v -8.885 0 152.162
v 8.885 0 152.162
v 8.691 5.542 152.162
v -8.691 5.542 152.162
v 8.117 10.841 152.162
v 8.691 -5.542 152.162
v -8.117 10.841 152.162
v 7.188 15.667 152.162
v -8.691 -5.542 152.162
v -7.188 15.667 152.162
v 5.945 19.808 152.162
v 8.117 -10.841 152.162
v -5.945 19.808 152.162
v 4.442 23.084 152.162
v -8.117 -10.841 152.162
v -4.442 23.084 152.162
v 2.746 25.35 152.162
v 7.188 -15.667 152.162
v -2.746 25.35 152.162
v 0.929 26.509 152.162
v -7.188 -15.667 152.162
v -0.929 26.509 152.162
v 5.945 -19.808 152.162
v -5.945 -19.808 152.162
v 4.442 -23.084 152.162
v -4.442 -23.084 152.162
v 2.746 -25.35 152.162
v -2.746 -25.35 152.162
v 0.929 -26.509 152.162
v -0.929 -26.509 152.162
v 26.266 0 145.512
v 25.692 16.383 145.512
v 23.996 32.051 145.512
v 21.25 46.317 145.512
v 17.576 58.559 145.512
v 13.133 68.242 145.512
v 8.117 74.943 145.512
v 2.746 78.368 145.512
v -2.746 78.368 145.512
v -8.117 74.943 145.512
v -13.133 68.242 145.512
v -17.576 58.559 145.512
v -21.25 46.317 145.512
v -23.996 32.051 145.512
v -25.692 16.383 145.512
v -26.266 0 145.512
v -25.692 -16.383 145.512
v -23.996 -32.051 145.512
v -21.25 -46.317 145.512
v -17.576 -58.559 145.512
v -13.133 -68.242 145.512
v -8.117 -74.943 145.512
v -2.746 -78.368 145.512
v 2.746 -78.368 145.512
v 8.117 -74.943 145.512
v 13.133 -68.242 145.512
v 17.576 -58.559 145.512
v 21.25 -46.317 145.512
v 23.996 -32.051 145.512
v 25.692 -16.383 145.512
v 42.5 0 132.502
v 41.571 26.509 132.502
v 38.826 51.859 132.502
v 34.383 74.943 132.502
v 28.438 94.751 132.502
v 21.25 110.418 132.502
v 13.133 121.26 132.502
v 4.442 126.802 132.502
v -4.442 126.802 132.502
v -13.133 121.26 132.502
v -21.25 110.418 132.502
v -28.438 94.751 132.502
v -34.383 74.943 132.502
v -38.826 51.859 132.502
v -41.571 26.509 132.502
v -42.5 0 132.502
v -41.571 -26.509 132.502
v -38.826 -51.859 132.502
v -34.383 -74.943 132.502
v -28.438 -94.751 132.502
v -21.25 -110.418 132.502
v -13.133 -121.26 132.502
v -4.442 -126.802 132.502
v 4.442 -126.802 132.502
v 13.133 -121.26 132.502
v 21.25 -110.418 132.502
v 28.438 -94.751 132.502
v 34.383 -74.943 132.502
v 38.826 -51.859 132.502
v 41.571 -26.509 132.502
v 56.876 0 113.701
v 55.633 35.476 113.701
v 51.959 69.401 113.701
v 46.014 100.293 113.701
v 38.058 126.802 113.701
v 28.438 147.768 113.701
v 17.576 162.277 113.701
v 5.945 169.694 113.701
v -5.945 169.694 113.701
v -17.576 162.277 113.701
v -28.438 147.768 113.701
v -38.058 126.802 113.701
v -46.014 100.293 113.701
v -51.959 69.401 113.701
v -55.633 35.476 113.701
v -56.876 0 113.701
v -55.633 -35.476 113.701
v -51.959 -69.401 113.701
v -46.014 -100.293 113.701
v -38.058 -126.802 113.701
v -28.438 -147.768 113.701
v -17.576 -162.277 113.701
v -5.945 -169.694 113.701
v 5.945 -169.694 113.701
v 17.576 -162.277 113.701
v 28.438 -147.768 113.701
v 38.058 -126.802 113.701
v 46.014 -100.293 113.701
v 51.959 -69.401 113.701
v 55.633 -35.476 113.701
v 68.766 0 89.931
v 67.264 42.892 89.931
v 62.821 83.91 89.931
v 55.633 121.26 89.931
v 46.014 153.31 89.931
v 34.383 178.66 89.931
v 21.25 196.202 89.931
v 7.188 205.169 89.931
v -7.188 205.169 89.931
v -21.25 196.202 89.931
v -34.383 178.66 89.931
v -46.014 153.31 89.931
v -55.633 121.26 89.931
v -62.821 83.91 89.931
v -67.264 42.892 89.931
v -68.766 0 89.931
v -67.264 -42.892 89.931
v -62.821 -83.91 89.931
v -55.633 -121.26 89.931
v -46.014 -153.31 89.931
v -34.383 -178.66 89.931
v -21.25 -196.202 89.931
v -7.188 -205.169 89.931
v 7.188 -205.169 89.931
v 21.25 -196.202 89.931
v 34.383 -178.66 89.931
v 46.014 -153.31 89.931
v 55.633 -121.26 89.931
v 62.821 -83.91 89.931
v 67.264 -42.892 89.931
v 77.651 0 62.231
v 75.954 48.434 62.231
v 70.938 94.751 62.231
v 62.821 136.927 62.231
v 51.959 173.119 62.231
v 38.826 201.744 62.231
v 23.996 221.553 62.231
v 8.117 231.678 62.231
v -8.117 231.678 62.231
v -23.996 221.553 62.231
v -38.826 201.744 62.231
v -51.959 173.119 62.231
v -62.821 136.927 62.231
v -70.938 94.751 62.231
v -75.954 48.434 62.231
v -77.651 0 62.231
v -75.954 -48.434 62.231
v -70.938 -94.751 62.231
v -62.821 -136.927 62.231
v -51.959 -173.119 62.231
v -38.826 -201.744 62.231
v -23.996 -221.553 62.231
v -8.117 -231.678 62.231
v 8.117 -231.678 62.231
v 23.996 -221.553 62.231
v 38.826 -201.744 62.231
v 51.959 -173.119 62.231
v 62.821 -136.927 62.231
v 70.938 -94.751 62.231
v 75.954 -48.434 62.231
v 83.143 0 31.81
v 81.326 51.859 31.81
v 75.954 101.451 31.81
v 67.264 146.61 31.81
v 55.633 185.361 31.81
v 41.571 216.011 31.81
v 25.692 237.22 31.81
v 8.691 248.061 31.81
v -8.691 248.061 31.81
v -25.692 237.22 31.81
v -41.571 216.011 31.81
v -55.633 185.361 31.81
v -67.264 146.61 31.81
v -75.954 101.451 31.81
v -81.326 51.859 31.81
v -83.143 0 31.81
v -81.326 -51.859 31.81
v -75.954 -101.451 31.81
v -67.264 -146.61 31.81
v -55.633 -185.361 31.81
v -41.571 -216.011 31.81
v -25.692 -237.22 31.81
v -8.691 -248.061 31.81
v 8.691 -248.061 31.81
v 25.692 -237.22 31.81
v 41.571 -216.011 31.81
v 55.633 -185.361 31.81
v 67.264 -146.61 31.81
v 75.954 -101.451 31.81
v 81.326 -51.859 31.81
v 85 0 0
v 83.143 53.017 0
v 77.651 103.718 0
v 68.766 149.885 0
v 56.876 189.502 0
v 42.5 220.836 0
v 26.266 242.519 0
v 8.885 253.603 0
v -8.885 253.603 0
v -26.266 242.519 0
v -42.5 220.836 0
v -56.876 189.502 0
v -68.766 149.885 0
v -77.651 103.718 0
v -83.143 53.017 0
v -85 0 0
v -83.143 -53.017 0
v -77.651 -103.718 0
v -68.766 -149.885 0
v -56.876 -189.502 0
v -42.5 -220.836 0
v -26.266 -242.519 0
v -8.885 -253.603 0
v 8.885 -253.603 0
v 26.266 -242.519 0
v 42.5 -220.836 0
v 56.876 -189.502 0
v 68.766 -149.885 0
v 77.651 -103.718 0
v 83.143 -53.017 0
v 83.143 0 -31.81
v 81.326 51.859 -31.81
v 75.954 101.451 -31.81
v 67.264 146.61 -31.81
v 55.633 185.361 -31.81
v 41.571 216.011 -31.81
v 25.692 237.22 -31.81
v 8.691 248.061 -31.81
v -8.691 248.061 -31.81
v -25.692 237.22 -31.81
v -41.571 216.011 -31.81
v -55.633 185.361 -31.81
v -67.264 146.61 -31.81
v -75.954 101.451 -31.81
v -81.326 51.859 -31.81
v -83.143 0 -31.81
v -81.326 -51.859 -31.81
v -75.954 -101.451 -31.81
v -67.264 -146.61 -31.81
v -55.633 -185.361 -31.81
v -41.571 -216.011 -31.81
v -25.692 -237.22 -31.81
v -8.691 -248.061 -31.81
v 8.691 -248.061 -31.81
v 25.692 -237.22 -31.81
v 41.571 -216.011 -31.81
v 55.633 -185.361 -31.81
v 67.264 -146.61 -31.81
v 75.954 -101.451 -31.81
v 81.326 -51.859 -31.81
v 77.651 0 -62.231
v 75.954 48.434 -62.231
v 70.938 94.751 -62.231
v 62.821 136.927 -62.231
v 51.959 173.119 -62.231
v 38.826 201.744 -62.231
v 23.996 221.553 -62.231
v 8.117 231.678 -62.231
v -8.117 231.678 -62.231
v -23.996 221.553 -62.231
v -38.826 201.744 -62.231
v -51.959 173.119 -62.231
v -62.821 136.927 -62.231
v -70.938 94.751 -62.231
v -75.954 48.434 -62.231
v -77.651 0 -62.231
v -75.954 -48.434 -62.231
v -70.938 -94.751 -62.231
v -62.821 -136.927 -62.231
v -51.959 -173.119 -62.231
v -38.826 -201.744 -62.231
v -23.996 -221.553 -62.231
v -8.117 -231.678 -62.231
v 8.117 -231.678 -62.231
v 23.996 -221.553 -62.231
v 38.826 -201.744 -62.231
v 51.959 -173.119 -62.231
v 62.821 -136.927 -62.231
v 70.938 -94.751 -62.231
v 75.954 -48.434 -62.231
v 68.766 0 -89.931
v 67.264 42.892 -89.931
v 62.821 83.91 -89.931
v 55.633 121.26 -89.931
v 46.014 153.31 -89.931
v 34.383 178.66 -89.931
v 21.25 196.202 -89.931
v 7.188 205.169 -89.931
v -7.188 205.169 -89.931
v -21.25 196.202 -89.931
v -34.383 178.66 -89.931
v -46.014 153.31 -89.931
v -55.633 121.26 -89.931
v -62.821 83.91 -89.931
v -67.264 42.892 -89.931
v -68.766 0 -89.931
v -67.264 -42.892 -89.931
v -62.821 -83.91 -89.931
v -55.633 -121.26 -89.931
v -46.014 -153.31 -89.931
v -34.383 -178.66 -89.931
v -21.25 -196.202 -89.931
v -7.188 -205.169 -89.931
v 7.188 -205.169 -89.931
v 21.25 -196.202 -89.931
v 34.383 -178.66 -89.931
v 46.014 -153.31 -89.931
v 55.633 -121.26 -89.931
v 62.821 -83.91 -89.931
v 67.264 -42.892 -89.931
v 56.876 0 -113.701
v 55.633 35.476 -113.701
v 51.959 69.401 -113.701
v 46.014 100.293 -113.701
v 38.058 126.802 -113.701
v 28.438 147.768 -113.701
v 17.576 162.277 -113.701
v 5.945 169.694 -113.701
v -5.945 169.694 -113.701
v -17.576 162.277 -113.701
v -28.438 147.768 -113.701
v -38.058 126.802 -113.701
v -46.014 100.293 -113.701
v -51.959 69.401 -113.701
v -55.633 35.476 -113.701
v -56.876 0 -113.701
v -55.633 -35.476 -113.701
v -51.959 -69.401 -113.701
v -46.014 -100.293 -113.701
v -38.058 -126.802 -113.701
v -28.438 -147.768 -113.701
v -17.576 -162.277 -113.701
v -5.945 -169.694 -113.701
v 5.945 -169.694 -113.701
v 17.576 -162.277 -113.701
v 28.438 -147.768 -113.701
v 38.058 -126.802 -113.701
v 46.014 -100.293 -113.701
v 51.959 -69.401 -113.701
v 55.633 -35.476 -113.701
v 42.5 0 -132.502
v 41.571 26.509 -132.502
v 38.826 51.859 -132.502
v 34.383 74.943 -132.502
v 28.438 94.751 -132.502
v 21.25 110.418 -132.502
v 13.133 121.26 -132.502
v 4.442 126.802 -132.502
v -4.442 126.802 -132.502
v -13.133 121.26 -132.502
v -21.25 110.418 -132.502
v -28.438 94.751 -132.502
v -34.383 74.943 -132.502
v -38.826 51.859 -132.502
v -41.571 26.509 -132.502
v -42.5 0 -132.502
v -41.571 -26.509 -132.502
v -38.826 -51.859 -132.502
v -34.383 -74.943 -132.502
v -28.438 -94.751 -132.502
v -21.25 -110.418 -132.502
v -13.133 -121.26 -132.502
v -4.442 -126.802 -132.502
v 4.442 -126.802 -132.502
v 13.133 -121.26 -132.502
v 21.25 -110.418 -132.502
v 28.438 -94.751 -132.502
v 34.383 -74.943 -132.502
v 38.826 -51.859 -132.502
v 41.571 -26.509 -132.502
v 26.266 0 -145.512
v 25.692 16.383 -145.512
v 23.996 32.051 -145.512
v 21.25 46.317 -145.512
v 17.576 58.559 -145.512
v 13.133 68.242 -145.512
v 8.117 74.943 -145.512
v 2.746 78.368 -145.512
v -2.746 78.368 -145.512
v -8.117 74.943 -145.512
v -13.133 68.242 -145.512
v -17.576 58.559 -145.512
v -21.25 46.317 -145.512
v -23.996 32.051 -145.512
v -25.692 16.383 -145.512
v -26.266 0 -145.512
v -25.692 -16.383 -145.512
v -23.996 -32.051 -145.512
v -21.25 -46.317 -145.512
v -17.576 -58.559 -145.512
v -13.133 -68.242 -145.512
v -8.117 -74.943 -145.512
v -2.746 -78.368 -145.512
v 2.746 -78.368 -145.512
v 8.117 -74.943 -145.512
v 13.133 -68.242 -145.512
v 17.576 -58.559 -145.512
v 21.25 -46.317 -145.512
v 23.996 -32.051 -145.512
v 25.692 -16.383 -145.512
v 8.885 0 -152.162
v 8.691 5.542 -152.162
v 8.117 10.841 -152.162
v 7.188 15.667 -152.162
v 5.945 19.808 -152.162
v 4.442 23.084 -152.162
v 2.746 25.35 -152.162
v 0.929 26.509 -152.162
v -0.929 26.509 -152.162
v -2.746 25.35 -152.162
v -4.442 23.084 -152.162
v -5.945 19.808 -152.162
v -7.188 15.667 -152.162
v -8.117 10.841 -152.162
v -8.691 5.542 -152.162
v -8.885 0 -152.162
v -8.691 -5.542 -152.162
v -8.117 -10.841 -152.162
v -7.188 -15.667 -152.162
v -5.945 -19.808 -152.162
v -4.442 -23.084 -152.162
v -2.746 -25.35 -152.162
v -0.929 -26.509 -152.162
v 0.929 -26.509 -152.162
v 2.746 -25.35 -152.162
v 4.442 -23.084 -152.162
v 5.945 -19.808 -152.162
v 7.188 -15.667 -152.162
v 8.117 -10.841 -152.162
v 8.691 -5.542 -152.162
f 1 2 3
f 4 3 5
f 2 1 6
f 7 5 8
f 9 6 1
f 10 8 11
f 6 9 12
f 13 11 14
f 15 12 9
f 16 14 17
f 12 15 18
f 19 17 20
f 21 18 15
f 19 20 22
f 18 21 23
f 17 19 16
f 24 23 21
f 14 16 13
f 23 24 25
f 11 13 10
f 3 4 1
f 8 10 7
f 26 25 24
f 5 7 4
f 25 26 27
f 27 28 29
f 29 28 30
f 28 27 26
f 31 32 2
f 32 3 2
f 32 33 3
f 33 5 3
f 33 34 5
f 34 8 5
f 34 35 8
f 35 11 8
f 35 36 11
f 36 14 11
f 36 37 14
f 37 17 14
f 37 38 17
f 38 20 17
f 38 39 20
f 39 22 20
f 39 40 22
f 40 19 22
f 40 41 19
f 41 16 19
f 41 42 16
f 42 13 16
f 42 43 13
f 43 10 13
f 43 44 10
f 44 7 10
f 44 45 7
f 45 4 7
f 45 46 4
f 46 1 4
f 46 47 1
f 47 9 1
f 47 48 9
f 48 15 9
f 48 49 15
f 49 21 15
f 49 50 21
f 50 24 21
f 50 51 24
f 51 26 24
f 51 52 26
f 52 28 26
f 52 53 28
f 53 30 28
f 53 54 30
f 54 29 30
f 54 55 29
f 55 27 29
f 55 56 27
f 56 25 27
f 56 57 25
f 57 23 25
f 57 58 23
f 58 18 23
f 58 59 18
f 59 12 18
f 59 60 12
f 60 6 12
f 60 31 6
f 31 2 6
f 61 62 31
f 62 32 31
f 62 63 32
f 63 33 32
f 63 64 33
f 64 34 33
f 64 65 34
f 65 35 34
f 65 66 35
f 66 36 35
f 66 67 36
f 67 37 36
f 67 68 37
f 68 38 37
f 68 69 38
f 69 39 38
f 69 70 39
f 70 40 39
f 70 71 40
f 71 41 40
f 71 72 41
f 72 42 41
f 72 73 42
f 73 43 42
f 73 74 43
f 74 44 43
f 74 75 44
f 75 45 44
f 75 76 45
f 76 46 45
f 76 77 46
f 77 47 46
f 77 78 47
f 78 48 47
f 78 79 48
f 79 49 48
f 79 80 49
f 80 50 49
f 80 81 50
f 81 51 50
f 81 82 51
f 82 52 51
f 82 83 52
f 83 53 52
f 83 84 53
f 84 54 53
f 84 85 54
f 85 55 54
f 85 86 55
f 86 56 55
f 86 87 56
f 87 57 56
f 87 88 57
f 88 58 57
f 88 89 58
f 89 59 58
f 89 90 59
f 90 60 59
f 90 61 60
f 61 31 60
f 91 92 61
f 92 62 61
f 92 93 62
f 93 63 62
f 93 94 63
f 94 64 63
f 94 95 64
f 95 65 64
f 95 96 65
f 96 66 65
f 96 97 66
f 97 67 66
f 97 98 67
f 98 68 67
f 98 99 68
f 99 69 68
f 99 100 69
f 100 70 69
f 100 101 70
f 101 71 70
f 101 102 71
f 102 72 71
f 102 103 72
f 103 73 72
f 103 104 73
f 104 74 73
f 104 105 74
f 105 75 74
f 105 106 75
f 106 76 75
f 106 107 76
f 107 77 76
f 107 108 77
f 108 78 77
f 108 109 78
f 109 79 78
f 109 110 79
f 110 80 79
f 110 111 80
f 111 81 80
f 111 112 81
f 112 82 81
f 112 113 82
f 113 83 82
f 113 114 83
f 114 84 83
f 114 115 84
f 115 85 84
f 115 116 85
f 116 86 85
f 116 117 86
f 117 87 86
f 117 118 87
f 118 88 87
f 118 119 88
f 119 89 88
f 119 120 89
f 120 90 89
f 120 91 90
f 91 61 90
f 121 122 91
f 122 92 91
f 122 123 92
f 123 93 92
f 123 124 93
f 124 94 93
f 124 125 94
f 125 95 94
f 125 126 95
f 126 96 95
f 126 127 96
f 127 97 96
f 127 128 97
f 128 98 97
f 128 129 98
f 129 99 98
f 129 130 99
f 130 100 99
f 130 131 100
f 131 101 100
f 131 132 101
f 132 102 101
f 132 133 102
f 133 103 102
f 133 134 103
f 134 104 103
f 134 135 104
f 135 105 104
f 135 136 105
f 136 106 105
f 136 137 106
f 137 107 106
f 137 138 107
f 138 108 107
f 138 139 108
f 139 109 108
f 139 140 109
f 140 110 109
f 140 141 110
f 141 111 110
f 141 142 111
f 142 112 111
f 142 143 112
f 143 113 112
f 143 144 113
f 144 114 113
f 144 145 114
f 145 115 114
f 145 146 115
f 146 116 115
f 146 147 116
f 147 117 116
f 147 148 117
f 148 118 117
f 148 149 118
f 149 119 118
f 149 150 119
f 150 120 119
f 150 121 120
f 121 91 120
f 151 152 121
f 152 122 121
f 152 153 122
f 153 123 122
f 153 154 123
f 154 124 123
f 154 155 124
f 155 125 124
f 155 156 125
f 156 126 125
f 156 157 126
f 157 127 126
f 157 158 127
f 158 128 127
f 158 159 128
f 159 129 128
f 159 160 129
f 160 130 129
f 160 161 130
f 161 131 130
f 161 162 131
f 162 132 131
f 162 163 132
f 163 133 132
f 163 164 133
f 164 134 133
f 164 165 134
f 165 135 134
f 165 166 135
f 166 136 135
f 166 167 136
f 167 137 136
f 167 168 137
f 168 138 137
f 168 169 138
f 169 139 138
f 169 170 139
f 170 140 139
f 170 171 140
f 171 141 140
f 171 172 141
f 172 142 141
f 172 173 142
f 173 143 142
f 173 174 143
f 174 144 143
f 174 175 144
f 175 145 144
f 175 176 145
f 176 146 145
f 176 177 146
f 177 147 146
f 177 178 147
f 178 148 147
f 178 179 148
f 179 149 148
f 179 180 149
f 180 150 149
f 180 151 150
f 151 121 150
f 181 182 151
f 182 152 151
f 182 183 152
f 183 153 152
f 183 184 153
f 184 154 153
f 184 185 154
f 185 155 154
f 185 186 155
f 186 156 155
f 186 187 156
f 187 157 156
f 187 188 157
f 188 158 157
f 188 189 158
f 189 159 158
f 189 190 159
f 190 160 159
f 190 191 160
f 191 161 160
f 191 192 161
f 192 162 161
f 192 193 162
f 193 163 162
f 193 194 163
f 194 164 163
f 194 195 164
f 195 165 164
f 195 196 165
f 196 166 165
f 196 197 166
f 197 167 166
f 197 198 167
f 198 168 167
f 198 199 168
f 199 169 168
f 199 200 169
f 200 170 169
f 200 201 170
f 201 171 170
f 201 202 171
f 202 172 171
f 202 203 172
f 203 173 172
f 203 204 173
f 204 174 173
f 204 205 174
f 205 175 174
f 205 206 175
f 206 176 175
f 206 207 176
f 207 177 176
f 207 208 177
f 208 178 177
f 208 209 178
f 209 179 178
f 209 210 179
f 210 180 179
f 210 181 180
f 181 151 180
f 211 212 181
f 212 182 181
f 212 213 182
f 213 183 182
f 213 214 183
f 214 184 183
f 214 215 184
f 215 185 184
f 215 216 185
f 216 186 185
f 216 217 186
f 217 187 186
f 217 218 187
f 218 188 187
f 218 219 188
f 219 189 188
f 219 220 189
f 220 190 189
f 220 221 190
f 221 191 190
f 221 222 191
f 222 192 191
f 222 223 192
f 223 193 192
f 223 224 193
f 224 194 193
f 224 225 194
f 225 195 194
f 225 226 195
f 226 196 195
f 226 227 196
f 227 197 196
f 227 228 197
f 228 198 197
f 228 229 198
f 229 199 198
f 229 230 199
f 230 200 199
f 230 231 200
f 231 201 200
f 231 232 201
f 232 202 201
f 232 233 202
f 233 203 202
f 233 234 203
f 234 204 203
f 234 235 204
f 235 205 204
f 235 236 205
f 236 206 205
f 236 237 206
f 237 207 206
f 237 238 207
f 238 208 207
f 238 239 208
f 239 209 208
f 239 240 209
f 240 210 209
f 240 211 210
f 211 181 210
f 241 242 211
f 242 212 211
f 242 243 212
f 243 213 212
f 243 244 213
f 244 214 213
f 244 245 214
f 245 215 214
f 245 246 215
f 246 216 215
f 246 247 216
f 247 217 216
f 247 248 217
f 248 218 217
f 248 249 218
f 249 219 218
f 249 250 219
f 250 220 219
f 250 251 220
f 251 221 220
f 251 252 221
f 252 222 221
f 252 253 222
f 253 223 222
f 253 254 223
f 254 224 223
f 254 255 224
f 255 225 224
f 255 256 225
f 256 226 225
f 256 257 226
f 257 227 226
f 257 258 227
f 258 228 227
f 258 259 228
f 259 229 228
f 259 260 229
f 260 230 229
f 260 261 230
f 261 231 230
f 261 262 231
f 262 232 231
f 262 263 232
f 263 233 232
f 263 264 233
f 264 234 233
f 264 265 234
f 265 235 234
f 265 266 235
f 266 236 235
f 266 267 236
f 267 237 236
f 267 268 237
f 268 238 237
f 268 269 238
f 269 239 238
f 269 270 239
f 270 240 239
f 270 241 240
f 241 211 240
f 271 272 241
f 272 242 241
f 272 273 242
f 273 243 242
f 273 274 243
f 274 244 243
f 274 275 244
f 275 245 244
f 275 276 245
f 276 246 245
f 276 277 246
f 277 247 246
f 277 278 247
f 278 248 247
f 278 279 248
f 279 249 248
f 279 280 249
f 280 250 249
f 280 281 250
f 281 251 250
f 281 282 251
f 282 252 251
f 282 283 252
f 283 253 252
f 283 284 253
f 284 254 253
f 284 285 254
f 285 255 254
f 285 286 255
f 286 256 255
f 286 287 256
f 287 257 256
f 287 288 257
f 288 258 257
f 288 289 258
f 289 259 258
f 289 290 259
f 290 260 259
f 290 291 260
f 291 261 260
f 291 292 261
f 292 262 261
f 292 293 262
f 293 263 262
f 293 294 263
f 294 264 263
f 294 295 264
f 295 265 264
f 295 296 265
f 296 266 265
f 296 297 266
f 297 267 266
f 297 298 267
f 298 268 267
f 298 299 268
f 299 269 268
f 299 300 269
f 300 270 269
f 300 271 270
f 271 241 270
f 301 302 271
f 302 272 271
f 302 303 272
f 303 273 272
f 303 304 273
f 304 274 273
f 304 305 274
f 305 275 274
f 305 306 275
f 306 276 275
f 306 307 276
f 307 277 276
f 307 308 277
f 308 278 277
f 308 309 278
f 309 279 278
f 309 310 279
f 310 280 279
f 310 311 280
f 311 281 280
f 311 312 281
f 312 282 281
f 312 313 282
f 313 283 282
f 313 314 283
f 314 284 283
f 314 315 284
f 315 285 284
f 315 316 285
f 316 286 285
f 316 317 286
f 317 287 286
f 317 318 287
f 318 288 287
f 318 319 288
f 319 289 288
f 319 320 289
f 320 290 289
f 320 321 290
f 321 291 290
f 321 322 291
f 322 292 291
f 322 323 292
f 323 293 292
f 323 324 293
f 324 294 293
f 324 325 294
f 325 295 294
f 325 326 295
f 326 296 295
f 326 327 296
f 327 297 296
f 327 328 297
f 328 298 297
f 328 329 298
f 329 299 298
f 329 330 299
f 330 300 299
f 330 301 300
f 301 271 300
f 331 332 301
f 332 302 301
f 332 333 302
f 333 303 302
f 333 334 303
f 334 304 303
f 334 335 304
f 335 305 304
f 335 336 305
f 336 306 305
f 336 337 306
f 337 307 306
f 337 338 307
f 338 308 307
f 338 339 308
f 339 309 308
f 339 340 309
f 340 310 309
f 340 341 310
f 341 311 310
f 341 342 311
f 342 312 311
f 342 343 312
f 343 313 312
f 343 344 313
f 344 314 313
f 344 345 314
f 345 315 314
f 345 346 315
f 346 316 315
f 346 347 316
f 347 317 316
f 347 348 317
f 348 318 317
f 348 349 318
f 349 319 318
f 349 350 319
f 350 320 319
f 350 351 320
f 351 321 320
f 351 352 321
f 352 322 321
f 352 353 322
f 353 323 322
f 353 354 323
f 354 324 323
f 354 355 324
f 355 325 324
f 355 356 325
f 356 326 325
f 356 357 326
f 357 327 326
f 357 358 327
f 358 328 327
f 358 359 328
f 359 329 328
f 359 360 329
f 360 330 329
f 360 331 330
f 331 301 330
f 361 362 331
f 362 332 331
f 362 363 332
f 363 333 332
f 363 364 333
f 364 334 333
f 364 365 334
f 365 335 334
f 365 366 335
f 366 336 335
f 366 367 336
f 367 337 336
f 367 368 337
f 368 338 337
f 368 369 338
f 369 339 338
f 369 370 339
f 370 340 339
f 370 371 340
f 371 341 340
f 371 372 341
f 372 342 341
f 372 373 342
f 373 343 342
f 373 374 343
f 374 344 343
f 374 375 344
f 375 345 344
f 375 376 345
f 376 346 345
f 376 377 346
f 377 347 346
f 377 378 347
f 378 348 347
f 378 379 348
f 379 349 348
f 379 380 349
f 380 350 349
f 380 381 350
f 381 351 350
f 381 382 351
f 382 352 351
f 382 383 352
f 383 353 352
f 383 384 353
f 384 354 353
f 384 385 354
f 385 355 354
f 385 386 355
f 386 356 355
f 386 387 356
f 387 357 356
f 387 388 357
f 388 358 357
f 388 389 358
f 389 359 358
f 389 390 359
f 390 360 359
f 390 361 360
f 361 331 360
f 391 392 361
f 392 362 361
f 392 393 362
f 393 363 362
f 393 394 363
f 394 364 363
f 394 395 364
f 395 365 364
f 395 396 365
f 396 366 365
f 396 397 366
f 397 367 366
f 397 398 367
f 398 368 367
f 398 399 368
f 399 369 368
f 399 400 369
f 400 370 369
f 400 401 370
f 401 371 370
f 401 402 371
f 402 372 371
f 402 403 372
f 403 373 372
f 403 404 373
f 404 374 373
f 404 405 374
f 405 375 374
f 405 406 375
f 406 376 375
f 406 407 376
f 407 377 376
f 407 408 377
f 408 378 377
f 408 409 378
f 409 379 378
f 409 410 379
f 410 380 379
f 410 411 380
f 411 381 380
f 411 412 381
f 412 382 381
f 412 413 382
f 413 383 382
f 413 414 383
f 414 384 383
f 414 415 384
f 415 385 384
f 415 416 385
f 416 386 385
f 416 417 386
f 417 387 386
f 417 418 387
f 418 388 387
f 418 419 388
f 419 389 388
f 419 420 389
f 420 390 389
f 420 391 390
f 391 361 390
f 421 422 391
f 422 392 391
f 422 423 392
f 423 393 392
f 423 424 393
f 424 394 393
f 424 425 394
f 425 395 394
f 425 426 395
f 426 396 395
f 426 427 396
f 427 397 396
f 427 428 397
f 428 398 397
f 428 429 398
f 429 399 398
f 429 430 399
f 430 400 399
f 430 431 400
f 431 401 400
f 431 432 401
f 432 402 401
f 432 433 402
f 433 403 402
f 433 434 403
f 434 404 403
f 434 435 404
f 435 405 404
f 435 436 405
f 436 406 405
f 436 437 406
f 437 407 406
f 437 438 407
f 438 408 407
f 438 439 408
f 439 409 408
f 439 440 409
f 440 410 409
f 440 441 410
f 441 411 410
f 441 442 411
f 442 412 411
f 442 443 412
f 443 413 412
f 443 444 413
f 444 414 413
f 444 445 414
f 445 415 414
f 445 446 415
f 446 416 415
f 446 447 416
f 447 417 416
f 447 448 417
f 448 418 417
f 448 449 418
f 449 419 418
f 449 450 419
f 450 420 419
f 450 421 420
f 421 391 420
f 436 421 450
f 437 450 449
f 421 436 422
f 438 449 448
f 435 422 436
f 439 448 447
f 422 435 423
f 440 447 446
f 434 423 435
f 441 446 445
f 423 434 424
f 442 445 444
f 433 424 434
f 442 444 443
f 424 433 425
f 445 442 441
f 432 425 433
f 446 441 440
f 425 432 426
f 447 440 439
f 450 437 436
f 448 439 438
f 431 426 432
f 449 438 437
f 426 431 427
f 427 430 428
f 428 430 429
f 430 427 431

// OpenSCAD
// Generated by SolidPython 1.0.1 on 2020-07-29 00:46:46


scale(v = [5, 15, 9]) {
	sphere(r = 17);
}
/***********************************************
*********      SolidPython code:      **********
************************************************
 
# import packages: SolidPython
from solid import *
from solid.utils import *
from itertools import chain, combinations, permutations


class Resize:

    def __init__(self, scad_file):
        self.scad_file = scad_file
        #self.scad_file = import_scad(scad_file)
        # cone/cylinder param:
        self.r1 = 0
        self.r2 = 0
        self.h = 0
        # rectangular prism param:
        self.w = 0
        self.l = 0
        # ellipse param:
        self.r = 0

    # import OpenScad code (file name corresponds to shape)


    # classify shape + parameters
    def assign(self, param1, param2, param3):
        if self.scad_file == 'cone.scad':
            self.r1 = param1
            self.r2 = param2
            self.h = param3
        elif self.scad_file == 'cylinder.scad':
            self.r1 = param1
            self.r2 = param2
            self.h = param3
        elif self.scad_file == 'rectangularPrism.scad':
            self.h = param1
            self.l = param2
            self.w = param3
        else:
            self.r = param1
            self.h = param2

    # resize parameters
    def iterate(self):
        x = range(3, 20, 2)
        i = 1
        if self.scad_file == 'cone.scad':
            tempList = list(permutations(x, 2))
            for temp in tempList:
                param1 = temp[0]
                param2 = temp[1]
                filepath = 'produced_scad_files/' + 'cone' + str(param1) + '_' + str(param2) + '_' + '.scad'
                scad_render_to_file(cylinder(h=param1, r1=param2, r2=0), filepath)

        elif self.scad_file == 'cylinder.scad':
            tempList = list(permutations(x, 3))
            for temp in tempList:
                param1 = temp[0]
                param2 = temp[1]
                filepath = 'produced_scad_files/' + 'cylinder' + str(param1) + '_' + str(param2) + '_' + '.scad'
                scad_render_to_file(cylinder(h=param1, r1=param2, r2=param2), filepath)

        elif self.scad_file == 'rectangularPrism.scad':
            tempList = list(permutations(x, 3))
            for temp in tempList:
                param1 = temp[0]
                param2 = temp[1]
                param3 = temp[2]
                filepath = 'produced_scad_files/' + 'rectangularPrism' + str(param1) + '_' + str(param2) + '_' + str(
                    param3) + '.scad'
                scad_render_to_file(cube(size=(param1, param2, param3)), filepath)

        elif self.scad_file == 'ellipse.scad':
            tempList = list(permutations(x, 4))
            for temp in tempList:
                param1 = temp[0]
                param2 = temp[1]
                param3 = temp[2]
                param4 = temp[3]
                filepath = 'produced_scad_files/' + 'ellipse' + str(param1) + '_' + str(param2) + '_' + str(param3) + '_' + str(param4) + '.scad'
                scad_render_to_file(scale([param1, param2, param3])(sphere(r=param4)), filepath)

    def render_to_scadfile(self):
        scad_render_to_file(scad, 'example.scad') 
 
************************************************/
